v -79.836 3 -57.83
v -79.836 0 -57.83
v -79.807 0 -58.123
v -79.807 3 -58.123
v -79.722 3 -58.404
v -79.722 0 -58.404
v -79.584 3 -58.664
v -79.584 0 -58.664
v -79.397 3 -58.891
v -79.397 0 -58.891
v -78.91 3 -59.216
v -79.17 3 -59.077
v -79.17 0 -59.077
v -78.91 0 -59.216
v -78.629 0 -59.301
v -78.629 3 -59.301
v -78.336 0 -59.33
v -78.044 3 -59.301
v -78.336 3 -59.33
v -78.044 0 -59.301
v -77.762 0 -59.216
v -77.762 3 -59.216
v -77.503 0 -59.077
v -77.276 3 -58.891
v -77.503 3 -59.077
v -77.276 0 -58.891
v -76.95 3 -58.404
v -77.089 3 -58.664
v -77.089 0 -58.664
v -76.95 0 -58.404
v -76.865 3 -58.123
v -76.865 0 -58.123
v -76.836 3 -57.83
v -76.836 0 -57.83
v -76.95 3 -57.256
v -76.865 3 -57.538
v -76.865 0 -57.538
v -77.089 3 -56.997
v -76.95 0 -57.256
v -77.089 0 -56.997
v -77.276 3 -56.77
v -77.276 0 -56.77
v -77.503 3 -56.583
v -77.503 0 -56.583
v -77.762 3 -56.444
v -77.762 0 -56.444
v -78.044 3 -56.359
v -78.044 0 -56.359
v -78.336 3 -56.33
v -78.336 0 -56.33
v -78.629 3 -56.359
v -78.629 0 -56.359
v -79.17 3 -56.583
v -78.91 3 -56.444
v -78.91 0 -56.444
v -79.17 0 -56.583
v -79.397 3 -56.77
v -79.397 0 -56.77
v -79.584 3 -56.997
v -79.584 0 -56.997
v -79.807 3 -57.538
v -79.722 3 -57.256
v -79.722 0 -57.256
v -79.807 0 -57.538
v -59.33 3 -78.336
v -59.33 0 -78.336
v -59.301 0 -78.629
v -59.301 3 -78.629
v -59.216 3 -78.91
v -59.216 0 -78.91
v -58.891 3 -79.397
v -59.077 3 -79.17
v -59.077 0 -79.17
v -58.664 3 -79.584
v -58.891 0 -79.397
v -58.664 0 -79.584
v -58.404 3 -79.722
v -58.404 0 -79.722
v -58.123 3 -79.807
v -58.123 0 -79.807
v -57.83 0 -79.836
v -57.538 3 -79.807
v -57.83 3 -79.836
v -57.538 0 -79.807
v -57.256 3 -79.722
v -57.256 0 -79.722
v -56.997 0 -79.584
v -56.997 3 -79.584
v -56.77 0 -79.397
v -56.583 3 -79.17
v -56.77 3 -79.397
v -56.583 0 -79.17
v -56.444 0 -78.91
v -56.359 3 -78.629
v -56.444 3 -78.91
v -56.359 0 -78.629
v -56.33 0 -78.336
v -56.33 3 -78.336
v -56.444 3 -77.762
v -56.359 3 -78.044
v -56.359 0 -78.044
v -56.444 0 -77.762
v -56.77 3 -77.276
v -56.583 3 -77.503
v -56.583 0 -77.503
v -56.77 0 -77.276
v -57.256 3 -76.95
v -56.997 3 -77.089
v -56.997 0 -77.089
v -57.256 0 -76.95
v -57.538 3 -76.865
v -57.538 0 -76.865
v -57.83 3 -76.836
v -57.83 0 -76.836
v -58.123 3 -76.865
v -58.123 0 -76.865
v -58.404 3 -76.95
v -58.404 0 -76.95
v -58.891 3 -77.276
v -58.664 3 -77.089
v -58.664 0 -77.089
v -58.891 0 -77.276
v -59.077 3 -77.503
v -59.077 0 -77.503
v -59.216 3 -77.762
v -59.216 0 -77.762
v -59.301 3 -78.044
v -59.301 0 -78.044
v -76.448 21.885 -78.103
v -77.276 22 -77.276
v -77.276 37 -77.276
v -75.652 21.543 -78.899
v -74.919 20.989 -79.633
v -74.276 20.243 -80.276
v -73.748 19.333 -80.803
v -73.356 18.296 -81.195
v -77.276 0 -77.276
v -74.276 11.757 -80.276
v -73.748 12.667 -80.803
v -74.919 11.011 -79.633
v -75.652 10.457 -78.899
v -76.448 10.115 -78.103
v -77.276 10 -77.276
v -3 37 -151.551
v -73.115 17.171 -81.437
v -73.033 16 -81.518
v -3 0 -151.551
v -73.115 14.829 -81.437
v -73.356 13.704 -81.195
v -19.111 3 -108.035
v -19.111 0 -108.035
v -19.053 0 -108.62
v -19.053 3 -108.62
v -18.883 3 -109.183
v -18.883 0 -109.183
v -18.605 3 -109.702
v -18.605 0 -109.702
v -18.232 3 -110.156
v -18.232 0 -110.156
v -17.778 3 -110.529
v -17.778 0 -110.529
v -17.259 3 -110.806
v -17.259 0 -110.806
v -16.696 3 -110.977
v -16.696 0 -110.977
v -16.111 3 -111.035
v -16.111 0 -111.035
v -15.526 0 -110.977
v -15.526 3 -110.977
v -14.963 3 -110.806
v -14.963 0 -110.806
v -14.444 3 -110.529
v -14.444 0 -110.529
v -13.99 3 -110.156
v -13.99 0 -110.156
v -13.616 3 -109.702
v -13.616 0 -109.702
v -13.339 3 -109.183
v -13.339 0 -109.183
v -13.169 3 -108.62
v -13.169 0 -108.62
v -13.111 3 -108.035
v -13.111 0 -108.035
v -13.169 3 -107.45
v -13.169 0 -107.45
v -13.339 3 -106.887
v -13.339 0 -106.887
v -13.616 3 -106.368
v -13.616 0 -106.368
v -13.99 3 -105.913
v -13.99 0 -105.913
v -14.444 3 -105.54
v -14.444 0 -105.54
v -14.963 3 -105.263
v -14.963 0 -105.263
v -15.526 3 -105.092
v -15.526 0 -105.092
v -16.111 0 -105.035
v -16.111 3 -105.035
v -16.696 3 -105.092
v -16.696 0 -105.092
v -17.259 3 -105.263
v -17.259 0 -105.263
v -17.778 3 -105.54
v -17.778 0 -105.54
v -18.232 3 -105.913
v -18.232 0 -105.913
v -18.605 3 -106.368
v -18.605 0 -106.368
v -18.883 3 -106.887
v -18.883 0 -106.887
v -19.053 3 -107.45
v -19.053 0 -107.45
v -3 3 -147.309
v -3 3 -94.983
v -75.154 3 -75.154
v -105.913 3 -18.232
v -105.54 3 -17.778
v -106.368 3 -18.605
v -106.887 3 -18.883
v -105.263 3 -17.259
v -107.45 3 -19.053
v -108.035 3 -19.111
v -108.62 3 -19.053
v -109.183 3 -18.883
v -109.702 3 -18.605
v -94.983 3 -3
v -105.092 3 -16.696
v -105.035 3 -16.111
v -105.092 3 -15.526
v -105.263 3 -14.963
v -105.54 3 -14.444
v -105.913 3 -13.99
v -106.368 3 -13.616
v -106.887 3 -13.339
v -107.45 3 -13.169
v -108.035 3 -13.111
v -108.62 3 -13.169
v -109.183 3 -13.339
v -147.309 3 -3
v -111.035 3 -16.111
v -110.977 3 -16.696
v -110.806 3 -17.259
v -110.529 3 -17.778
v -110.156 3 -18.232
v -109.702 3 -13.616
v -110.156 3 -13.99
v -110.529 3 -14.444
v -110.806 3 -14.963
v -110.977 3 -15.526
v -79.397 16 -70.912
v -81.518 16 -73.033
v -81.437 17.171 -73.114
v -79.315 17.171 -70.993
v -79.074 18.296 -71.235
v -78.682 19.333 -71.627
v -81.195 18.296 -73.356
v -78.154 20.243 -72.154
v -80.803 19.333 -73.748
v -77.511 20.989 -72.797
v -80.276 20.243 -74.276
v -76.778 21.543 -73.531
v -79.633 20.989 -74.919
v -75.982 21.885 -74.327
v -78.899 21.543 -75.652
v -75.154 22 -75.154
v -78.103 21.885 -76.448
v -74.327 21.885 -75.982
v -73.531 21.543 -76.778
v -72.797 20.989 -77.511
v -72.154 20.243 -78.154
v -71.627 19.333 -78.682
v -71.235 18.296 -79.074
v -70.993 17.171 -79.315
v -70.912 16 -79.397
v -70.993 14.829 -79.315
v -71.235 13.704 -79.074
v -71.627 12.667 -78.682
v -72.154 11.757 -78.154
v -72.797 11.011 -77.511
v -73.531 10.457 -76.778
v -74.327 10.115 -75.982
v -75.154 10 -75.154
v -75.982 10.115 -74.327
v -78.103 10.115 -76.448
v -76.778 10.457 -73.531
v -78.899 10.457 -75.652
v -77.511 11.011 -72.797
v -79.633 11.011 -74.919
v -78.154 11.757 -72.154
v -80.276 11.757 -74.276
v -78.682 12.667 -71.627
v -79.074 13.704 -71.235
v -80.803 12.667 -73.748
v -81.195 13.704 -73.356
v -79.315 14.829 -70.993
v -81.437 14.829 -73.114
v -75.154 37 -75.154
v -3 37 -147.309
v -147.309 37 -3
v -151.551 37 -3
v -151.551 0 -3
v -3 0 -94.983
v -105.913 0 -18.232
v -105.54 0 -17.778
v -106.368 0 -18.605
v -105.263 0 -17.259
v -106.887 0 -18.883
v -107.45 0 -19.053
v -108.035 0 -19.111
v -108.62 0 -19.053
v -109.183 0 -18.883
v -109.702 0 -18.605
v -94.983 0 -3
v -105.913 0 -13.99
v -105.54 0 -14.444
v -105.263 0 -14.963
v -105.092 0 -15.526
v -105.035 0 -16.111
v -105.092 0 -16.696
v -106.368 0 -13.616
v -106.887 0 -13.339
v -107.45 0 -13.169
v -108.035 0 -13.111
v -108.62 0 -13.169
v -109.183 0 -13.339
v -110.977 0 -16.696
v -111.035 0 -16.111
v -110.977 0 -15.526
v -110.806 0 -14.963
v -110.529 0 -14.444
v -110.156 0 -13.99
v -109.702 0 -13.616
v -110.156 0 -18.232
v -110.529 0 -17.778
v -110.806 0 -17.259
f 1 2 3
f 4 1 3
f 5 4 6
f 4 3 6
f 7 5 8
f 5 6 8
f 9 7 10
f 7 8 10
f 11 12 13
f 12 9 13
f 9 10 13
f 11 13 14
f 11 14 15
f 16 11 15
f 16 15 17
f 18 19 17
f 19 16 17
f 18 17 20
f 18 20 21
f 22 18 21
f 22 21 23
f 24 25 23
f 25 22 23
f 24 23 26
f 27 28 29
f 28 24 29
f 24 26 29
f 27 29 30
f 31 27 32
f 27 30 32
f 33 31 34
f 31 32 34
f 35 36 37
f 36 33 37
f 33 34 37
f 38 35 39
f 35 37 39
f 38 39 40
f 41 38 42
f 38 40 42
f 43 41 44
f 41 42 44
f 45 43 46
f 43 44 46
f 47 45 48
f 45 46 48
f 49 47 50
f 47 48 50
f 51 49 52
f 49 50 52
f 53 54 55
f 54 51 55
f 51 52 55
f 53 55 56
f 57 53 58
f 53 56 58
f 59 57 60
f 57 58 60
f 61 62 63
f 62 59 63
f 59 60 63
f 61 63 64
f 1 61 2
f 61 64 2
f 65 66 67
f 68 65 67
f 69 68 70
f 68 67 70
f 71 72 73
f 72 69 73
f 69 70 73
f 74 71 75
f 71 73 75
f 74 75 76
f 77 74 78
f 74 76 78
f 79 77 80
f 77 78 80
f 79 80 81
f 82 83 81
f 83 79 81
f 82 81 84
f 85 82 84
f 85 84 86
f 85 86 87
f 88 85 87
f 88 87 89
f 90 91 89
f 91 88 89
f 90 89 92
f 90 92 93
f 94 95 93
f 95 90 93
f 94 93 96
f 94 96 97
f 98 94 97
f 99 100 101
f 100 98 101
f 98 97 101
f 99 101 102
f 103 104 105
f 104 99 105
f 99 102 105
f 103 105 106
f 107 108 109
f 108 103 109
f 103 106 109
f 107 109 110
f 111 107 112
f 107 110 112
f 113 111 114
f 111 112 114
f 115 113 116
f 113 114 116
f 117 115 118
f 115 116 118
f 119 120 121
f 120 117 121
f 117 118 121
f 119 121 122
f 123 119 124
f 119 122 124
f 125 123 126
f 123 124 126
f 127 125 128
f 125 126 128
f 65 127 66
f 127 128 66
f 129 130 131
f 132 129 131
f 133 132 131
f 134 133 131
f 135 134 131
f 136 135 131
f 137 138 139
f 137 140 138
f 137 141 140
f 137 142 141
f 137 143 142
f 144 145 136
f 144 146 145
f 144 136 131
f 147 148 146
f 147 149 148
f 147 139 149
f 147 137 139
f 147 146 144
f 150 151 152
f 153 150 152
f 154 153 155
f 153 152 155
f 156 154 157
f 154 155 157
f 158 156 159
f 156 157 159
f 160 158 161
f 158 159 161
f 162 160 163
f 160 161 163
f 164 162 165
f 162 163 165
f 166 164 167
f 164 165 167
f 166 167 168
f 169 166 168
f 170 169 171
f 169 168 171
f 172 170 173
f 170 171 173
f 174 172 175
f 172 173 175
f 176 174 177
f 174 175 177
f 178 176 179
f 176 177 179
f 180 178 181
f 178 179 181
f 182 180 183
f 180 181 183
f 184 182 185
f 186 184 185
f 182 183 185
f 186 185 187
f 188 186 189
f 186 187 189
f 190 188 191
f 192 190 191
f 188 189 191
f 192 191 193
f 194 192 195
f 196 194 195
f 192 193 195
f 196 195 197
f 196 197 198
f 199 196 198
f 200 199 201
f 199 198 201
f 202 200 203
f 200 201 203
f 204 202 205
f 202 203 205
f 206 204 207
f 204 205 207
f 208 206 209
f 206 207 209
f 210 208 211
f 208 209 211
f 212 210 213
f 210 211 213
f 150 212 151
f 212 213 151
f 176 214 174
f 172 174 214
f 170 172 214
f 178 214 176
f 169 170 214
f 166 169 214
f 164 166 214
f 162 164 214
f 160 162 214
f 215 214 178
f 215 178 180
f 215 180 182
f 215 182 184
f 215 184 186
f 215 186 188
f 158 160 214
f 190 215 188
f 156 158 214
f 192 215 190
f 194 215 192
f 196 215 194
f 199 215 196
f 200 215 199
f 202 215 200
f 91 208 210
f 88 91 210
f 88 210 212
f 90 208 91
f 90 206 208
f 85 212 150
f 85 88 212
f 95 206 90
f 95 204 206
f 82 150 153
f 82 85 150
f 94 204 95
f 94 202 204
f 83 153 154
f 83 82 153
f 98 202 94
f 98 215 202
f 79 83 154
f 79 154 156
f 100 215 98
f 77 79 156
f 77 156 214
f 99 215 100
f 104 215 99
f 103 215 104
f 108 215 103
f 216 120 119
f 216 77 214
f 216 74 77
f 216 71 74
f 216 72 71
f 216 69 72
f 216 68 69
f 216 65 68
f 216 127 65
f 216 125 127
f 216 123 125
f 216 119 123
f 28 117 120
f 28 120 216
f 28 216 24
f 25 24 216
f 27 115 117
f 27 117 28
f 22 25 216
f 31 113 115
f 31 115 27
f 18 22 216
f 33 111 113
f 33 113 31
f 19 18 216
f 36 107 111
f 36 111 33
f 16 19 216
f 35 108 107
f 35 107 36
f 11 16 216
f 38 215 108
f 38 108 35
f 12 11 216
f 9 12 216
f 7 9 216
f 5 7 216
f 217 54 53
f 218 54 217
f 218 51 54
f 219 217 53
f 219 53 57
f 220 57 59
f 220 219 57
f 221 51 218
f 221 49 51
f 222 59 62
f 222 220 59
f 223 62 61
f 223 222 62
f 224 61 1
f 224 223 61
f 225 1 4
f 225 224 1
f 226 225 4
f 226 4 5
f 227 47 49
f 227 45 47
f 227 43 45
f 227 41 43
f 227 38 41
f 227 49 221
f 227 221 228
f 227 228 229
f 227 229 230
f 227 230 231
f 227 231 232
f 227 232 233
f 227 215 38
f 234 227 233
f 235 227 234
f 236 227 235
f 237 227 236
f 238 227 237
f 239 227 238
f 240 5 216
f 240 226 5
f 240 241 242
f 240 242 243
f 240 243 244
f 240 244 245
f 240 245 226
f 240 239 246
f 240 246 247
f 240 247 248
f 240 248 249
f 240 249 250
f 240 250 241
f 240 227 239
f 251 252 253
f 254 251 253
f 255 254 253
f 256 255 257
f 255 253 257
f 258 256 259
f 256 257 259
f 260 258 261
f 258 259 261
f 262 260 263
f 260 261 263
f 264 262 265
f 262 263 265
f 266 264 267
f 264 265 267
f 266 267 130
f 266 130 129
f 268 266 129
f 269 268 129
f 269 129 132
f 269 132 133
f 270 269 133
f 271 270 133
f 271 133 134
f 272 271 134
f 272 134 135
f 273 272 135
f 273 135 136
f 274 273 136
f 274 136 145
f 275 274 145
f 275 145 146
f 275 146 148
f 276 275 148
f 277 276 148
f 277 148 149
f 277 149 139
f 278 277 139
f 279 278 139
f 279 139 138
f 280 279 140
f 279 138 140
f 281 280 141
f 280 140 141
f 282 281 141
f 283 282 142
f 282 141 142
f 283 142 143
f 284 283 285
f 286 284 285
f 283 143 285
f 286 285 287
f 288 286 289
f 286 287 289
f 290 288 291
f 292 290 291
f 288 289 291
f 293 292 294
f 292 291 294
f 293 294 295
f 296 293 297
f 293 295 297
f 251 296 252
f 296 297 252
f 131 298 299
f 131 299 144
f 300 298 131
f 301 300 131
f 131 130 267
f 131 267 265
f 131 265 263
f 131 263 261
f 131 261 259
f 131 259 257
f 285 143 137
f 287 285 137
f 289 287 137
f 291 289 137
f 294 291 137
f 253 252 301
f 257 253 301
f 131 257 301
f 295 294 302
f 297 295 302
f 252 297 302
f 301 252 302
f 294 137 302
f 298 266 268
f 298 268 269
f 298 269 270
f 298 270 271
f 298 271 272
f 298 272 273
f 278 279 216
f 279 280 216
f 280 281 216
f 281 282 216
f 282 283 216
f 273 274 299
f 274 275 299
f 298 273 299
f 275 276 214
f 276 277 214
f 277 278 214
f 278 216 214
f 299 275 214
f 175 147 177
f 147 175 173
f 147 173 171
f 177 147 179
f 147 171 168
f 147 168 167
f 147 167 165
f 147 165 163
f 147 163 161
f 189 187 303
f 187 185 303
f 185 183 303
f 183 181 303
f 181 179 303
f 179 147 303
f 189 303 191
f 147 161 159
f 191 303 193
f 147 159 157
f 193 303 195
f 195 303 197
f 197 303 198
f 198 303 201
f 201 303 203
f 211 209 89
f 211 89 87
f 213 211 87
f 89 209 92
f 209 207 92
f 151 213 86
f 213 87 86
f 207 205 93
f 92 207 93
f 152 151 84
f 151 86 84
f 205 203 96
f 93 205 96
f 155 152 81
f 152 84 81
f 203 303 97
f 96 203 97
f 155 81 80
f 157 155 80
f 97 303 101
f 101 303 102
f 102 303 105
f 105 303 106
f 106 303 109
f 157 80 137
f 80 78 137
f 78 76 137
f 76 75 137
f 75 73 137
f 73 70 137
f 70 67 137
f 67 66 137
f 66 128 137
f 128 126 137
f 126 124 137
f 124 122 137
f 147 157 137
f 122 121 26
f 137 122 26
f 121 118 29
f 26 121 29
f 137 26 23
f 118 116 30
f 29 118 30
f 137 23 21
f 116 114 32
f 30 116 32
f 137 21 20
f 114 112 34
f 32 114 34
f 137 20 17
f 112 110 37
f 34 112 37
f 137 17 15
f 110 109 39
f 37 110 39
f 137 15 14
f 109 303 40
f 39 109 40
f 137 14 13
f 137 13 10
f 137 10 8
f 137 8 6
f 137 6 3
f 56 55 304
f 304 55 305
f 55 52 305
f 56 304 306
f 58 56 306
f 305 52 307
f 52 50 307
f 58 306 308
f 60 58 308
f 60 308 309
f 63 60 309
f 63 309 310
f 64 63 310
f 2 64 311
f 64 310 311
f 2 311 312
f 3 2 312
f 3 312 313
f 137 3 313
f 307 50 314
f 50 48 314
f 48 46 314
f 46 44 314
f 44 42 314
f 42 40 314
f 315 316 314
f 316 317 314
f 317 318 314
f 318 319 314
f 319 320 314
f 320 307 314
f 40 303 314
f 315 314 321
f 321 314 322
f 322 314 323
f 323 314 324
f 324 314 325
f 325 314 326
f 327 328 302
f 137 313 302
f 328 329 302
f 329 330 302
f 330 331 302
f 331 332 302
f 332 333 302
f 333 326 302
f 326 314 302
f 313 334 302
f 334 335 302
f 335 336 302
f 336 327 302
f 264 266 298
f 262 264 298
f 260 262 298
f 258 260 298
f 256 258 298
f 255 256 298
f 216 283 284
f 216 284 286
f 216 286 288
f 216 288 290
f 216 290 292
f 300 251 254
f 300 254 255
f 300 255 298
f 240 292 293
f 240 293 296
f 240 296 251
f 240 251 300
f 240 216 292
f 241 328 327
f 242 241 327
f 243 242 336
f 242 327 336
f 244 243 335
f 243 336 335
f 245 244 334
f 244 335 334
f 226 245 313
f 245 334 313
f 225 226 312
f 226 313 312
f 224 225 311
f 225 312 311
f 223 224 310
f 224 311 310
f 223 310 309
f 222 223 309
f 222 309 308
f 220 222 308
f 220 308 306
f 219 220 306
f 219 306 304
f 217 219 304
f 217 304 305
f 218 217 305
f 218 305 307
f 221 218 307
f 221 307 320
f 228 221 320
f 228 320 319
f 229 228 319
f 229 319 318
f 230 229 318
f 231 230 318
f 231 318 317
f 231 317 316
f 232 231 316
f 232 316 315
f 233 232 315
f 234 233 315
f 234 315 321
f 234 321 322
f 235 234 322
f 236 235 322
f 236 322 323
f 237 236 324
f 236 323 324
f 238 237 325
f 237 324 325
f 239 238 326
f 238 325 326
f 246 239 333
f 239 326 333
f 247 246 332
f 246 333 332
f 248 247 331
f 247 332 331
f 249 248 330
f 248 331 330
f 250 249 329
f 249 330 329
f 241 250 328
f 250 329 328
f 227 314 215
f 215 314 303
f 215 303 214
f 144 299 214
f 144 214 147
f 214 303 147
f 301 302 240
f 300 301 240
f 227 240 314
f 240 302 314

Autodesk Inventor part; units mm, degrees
ref_plane "YZ Plane" through (0, 0, 0) normal (1, 0, 0) x (0, 1, 0)
ref_plane "XZ Plane" through (0, 0, 0) normal (0, 1, 0) x (-1, 0, 0)
ref_plane "XY Plane" through (0, 0, 0) normal (0, 0, 1) x (1, 0, 0)
sketch "Sketch1" plane through (0, 0, 0) normal (0, 1, 0) x (-1, 0, 0)
  line L0 (0, 0) -> (0, -650)
  line L1 (0, -650) -> (650, -650)
  line L2 (650, -650) -> (650, 0)
  line L3 (650, 0) -> (0, 0)
  line L4 (0, 0) -> (3, 0)
  line L5 (3, 0) -> (3, -650)
  line L6 (3, -650) -> (0, -650)
  line L7 (0, -650) -> (0, -647)
  line L8 (0, -647) -> (650, -647)
  line L9 (650, -647) -> (650, -650)
  line L10 (650, -650) -> (647, -650)
  line L11 (647, -650) -> (647, 0)
  line L12 (647, 0) -> (650, 0)
  line L13 (650, 0) -> (650, -3)
  line L14 (650, -3) -> (0, -3)
  line L15 (0, -3) -> (0, 0)
  line L16 (0, 0) -> (0, -37)
  line L17 (0, -37) -> (650, -37)
  line L18 (650, -37) -> (650, 0)
  line L19 (650, 0) -> (613, 0)
  line L20 (613, 0) -> (613, -650)
  line L21 (613, -650) -> (650, -650)
  line L22 (650, -650) -> (650, -613)
  line L23 (650, -613) -> (0, -613)
  line L24 (0, -613) -> (0, -650)
  line L25 (0, -650) -> (37, -650)
  line L26 (37, -650) -> (37, 0)
  line L27 (37, 0) -> (0, 0)
  line L28 (0, 0) -> (650, -650)
  line L29 (650, 0) -> (0, -650)
  line L30 (37, -3) -> (3, -37)
  line L31 (20, -20) -> (75.1543, -75.1543)
  line L32 (75.1543, -75.1543) -> (3, -147.3087)
  line L33 (75.1543, -75.1543) -> (147.3087, -3)
  line L34 (75.1543, -75.1543) -> (48.9914, -48.9914)
  line L35 (48.9914, -48.9914) -> (3, -94.9828)
  line L36 (48.9914, -48.9914) -> (94.9828, -3)
  line L37 (75.1543, -75.1543) -> (77.2756, -77.2756)
  line L38 (77.2756, -77.2756) -> (3, -151.5513)
  line L39 (77.2756, -77.2756) -> (151.5513, -3)
  line L40 (75.1543, -75.1543) -> (68.0833, -68.0833)
  line L41 (68.0833, -68.0833) -> (57.8302, -78.3363)
  line L42 (68.0833, -68.0833) -> (78.3363, -57.8302)
  circle A0 centre (78.3363, -57.8302) radius 1.5
  circle A1 centre (57.8302, -78.3363) radius 1.5
  line L43 (3, -147.3087) -> (3, -94.9828)
  line L44 (147.3087, -3) -> (94.9828, -3)
  line L45 (121.1457, -3) -> (3, -121.1457)
  circle A2 centre (62.0729, -62.0729) radius 65
  circle A3 centre (108.0348, -16.1109) radius 3
  circle A4 centre (16.1109, -108.0348) radius 3
  dimension "d0" = 650
  dimension "d1" = 650
  dimension "d2" = 650
  dimension "d3" = 3
  dimension "d4" = 650
  dimension "d5" = 3
  dimension "d6" = 3
  dimension "d7" = 650
  dimension "d8" = 3
  dimension "d9" = 650
  dimension "d10" = 37
  dimension "d11" = 650
  dimension "d12" = 37
  dimension "d13" = 650
  dimension "d14" = 37
  dimension "d15" = 650
  dimension "d16" = 37
  dimension "d17" = 650
  dimension "d18" = 78
  dimension "d19" = 37
  dimension "d20" = 3
  dimension "d21" = 10
  dimension "d22" = 14.5
  dimension "d23" = 14.5
  dimension "d24" = 3
  dimension "d25" = 3
  dimension "d26" = 130
  dimension "d27" = 6
  dimension "d28" = 6
extrude "Extrusion1" add sketch "Sketch1" along normal blind 3 contours L35 A2 A4 L45 L5 | L35 L26 L45 A4 A2 | L36 A2 A3 L45 L17 | L17 L45 L28 L36 | L35 L28 L45 L26 | L14 L45 A3 A2 L36 | L45 A4 A2 L32 L5 | L45 A3 A2 L33 L17 | L17 L33 L28 L45 | L45 L28 L32 L26 | L26 L32 A2 A4 L45 | L14 L33 A2 A3 L45
extrude "Extrusion2" add sketch "Sketch1" along normal blind 37 contours L5 L32 A2 L38 | L39 A2 L33 L14 | L33 A2 L39 L17 | L17 L39 L28 L33 | L32 L28 L38 L26 | L26 L38 A2 L32
sketch "Sketch2" plane through (-151.5513, 0, -3) normal (-0.7071, 0, -0.7071) x (-0.7071, 0, 0.7071)
  line L0 (-105.0416, 0) -> (-105.0416, 3)
  line L1 (-105.0416, 3) -> (-105.0416, 23)
  line L2 (-3, 37) -> (-207.0833, 37) projected
  line L3 (-105.0416, 23) -> (-105.0416, 16)
  circle A0 centre (-105.0416, 16) radius 6
  dimension "d33" = 3
  dimension "d39" = 20
  dimension "d40" = 7
  dimension "d41" = 12
extrude "Extrusion4" cut sketch "Sketch2" against normal blind 10
properties part number "body_inner_L_clamp"
